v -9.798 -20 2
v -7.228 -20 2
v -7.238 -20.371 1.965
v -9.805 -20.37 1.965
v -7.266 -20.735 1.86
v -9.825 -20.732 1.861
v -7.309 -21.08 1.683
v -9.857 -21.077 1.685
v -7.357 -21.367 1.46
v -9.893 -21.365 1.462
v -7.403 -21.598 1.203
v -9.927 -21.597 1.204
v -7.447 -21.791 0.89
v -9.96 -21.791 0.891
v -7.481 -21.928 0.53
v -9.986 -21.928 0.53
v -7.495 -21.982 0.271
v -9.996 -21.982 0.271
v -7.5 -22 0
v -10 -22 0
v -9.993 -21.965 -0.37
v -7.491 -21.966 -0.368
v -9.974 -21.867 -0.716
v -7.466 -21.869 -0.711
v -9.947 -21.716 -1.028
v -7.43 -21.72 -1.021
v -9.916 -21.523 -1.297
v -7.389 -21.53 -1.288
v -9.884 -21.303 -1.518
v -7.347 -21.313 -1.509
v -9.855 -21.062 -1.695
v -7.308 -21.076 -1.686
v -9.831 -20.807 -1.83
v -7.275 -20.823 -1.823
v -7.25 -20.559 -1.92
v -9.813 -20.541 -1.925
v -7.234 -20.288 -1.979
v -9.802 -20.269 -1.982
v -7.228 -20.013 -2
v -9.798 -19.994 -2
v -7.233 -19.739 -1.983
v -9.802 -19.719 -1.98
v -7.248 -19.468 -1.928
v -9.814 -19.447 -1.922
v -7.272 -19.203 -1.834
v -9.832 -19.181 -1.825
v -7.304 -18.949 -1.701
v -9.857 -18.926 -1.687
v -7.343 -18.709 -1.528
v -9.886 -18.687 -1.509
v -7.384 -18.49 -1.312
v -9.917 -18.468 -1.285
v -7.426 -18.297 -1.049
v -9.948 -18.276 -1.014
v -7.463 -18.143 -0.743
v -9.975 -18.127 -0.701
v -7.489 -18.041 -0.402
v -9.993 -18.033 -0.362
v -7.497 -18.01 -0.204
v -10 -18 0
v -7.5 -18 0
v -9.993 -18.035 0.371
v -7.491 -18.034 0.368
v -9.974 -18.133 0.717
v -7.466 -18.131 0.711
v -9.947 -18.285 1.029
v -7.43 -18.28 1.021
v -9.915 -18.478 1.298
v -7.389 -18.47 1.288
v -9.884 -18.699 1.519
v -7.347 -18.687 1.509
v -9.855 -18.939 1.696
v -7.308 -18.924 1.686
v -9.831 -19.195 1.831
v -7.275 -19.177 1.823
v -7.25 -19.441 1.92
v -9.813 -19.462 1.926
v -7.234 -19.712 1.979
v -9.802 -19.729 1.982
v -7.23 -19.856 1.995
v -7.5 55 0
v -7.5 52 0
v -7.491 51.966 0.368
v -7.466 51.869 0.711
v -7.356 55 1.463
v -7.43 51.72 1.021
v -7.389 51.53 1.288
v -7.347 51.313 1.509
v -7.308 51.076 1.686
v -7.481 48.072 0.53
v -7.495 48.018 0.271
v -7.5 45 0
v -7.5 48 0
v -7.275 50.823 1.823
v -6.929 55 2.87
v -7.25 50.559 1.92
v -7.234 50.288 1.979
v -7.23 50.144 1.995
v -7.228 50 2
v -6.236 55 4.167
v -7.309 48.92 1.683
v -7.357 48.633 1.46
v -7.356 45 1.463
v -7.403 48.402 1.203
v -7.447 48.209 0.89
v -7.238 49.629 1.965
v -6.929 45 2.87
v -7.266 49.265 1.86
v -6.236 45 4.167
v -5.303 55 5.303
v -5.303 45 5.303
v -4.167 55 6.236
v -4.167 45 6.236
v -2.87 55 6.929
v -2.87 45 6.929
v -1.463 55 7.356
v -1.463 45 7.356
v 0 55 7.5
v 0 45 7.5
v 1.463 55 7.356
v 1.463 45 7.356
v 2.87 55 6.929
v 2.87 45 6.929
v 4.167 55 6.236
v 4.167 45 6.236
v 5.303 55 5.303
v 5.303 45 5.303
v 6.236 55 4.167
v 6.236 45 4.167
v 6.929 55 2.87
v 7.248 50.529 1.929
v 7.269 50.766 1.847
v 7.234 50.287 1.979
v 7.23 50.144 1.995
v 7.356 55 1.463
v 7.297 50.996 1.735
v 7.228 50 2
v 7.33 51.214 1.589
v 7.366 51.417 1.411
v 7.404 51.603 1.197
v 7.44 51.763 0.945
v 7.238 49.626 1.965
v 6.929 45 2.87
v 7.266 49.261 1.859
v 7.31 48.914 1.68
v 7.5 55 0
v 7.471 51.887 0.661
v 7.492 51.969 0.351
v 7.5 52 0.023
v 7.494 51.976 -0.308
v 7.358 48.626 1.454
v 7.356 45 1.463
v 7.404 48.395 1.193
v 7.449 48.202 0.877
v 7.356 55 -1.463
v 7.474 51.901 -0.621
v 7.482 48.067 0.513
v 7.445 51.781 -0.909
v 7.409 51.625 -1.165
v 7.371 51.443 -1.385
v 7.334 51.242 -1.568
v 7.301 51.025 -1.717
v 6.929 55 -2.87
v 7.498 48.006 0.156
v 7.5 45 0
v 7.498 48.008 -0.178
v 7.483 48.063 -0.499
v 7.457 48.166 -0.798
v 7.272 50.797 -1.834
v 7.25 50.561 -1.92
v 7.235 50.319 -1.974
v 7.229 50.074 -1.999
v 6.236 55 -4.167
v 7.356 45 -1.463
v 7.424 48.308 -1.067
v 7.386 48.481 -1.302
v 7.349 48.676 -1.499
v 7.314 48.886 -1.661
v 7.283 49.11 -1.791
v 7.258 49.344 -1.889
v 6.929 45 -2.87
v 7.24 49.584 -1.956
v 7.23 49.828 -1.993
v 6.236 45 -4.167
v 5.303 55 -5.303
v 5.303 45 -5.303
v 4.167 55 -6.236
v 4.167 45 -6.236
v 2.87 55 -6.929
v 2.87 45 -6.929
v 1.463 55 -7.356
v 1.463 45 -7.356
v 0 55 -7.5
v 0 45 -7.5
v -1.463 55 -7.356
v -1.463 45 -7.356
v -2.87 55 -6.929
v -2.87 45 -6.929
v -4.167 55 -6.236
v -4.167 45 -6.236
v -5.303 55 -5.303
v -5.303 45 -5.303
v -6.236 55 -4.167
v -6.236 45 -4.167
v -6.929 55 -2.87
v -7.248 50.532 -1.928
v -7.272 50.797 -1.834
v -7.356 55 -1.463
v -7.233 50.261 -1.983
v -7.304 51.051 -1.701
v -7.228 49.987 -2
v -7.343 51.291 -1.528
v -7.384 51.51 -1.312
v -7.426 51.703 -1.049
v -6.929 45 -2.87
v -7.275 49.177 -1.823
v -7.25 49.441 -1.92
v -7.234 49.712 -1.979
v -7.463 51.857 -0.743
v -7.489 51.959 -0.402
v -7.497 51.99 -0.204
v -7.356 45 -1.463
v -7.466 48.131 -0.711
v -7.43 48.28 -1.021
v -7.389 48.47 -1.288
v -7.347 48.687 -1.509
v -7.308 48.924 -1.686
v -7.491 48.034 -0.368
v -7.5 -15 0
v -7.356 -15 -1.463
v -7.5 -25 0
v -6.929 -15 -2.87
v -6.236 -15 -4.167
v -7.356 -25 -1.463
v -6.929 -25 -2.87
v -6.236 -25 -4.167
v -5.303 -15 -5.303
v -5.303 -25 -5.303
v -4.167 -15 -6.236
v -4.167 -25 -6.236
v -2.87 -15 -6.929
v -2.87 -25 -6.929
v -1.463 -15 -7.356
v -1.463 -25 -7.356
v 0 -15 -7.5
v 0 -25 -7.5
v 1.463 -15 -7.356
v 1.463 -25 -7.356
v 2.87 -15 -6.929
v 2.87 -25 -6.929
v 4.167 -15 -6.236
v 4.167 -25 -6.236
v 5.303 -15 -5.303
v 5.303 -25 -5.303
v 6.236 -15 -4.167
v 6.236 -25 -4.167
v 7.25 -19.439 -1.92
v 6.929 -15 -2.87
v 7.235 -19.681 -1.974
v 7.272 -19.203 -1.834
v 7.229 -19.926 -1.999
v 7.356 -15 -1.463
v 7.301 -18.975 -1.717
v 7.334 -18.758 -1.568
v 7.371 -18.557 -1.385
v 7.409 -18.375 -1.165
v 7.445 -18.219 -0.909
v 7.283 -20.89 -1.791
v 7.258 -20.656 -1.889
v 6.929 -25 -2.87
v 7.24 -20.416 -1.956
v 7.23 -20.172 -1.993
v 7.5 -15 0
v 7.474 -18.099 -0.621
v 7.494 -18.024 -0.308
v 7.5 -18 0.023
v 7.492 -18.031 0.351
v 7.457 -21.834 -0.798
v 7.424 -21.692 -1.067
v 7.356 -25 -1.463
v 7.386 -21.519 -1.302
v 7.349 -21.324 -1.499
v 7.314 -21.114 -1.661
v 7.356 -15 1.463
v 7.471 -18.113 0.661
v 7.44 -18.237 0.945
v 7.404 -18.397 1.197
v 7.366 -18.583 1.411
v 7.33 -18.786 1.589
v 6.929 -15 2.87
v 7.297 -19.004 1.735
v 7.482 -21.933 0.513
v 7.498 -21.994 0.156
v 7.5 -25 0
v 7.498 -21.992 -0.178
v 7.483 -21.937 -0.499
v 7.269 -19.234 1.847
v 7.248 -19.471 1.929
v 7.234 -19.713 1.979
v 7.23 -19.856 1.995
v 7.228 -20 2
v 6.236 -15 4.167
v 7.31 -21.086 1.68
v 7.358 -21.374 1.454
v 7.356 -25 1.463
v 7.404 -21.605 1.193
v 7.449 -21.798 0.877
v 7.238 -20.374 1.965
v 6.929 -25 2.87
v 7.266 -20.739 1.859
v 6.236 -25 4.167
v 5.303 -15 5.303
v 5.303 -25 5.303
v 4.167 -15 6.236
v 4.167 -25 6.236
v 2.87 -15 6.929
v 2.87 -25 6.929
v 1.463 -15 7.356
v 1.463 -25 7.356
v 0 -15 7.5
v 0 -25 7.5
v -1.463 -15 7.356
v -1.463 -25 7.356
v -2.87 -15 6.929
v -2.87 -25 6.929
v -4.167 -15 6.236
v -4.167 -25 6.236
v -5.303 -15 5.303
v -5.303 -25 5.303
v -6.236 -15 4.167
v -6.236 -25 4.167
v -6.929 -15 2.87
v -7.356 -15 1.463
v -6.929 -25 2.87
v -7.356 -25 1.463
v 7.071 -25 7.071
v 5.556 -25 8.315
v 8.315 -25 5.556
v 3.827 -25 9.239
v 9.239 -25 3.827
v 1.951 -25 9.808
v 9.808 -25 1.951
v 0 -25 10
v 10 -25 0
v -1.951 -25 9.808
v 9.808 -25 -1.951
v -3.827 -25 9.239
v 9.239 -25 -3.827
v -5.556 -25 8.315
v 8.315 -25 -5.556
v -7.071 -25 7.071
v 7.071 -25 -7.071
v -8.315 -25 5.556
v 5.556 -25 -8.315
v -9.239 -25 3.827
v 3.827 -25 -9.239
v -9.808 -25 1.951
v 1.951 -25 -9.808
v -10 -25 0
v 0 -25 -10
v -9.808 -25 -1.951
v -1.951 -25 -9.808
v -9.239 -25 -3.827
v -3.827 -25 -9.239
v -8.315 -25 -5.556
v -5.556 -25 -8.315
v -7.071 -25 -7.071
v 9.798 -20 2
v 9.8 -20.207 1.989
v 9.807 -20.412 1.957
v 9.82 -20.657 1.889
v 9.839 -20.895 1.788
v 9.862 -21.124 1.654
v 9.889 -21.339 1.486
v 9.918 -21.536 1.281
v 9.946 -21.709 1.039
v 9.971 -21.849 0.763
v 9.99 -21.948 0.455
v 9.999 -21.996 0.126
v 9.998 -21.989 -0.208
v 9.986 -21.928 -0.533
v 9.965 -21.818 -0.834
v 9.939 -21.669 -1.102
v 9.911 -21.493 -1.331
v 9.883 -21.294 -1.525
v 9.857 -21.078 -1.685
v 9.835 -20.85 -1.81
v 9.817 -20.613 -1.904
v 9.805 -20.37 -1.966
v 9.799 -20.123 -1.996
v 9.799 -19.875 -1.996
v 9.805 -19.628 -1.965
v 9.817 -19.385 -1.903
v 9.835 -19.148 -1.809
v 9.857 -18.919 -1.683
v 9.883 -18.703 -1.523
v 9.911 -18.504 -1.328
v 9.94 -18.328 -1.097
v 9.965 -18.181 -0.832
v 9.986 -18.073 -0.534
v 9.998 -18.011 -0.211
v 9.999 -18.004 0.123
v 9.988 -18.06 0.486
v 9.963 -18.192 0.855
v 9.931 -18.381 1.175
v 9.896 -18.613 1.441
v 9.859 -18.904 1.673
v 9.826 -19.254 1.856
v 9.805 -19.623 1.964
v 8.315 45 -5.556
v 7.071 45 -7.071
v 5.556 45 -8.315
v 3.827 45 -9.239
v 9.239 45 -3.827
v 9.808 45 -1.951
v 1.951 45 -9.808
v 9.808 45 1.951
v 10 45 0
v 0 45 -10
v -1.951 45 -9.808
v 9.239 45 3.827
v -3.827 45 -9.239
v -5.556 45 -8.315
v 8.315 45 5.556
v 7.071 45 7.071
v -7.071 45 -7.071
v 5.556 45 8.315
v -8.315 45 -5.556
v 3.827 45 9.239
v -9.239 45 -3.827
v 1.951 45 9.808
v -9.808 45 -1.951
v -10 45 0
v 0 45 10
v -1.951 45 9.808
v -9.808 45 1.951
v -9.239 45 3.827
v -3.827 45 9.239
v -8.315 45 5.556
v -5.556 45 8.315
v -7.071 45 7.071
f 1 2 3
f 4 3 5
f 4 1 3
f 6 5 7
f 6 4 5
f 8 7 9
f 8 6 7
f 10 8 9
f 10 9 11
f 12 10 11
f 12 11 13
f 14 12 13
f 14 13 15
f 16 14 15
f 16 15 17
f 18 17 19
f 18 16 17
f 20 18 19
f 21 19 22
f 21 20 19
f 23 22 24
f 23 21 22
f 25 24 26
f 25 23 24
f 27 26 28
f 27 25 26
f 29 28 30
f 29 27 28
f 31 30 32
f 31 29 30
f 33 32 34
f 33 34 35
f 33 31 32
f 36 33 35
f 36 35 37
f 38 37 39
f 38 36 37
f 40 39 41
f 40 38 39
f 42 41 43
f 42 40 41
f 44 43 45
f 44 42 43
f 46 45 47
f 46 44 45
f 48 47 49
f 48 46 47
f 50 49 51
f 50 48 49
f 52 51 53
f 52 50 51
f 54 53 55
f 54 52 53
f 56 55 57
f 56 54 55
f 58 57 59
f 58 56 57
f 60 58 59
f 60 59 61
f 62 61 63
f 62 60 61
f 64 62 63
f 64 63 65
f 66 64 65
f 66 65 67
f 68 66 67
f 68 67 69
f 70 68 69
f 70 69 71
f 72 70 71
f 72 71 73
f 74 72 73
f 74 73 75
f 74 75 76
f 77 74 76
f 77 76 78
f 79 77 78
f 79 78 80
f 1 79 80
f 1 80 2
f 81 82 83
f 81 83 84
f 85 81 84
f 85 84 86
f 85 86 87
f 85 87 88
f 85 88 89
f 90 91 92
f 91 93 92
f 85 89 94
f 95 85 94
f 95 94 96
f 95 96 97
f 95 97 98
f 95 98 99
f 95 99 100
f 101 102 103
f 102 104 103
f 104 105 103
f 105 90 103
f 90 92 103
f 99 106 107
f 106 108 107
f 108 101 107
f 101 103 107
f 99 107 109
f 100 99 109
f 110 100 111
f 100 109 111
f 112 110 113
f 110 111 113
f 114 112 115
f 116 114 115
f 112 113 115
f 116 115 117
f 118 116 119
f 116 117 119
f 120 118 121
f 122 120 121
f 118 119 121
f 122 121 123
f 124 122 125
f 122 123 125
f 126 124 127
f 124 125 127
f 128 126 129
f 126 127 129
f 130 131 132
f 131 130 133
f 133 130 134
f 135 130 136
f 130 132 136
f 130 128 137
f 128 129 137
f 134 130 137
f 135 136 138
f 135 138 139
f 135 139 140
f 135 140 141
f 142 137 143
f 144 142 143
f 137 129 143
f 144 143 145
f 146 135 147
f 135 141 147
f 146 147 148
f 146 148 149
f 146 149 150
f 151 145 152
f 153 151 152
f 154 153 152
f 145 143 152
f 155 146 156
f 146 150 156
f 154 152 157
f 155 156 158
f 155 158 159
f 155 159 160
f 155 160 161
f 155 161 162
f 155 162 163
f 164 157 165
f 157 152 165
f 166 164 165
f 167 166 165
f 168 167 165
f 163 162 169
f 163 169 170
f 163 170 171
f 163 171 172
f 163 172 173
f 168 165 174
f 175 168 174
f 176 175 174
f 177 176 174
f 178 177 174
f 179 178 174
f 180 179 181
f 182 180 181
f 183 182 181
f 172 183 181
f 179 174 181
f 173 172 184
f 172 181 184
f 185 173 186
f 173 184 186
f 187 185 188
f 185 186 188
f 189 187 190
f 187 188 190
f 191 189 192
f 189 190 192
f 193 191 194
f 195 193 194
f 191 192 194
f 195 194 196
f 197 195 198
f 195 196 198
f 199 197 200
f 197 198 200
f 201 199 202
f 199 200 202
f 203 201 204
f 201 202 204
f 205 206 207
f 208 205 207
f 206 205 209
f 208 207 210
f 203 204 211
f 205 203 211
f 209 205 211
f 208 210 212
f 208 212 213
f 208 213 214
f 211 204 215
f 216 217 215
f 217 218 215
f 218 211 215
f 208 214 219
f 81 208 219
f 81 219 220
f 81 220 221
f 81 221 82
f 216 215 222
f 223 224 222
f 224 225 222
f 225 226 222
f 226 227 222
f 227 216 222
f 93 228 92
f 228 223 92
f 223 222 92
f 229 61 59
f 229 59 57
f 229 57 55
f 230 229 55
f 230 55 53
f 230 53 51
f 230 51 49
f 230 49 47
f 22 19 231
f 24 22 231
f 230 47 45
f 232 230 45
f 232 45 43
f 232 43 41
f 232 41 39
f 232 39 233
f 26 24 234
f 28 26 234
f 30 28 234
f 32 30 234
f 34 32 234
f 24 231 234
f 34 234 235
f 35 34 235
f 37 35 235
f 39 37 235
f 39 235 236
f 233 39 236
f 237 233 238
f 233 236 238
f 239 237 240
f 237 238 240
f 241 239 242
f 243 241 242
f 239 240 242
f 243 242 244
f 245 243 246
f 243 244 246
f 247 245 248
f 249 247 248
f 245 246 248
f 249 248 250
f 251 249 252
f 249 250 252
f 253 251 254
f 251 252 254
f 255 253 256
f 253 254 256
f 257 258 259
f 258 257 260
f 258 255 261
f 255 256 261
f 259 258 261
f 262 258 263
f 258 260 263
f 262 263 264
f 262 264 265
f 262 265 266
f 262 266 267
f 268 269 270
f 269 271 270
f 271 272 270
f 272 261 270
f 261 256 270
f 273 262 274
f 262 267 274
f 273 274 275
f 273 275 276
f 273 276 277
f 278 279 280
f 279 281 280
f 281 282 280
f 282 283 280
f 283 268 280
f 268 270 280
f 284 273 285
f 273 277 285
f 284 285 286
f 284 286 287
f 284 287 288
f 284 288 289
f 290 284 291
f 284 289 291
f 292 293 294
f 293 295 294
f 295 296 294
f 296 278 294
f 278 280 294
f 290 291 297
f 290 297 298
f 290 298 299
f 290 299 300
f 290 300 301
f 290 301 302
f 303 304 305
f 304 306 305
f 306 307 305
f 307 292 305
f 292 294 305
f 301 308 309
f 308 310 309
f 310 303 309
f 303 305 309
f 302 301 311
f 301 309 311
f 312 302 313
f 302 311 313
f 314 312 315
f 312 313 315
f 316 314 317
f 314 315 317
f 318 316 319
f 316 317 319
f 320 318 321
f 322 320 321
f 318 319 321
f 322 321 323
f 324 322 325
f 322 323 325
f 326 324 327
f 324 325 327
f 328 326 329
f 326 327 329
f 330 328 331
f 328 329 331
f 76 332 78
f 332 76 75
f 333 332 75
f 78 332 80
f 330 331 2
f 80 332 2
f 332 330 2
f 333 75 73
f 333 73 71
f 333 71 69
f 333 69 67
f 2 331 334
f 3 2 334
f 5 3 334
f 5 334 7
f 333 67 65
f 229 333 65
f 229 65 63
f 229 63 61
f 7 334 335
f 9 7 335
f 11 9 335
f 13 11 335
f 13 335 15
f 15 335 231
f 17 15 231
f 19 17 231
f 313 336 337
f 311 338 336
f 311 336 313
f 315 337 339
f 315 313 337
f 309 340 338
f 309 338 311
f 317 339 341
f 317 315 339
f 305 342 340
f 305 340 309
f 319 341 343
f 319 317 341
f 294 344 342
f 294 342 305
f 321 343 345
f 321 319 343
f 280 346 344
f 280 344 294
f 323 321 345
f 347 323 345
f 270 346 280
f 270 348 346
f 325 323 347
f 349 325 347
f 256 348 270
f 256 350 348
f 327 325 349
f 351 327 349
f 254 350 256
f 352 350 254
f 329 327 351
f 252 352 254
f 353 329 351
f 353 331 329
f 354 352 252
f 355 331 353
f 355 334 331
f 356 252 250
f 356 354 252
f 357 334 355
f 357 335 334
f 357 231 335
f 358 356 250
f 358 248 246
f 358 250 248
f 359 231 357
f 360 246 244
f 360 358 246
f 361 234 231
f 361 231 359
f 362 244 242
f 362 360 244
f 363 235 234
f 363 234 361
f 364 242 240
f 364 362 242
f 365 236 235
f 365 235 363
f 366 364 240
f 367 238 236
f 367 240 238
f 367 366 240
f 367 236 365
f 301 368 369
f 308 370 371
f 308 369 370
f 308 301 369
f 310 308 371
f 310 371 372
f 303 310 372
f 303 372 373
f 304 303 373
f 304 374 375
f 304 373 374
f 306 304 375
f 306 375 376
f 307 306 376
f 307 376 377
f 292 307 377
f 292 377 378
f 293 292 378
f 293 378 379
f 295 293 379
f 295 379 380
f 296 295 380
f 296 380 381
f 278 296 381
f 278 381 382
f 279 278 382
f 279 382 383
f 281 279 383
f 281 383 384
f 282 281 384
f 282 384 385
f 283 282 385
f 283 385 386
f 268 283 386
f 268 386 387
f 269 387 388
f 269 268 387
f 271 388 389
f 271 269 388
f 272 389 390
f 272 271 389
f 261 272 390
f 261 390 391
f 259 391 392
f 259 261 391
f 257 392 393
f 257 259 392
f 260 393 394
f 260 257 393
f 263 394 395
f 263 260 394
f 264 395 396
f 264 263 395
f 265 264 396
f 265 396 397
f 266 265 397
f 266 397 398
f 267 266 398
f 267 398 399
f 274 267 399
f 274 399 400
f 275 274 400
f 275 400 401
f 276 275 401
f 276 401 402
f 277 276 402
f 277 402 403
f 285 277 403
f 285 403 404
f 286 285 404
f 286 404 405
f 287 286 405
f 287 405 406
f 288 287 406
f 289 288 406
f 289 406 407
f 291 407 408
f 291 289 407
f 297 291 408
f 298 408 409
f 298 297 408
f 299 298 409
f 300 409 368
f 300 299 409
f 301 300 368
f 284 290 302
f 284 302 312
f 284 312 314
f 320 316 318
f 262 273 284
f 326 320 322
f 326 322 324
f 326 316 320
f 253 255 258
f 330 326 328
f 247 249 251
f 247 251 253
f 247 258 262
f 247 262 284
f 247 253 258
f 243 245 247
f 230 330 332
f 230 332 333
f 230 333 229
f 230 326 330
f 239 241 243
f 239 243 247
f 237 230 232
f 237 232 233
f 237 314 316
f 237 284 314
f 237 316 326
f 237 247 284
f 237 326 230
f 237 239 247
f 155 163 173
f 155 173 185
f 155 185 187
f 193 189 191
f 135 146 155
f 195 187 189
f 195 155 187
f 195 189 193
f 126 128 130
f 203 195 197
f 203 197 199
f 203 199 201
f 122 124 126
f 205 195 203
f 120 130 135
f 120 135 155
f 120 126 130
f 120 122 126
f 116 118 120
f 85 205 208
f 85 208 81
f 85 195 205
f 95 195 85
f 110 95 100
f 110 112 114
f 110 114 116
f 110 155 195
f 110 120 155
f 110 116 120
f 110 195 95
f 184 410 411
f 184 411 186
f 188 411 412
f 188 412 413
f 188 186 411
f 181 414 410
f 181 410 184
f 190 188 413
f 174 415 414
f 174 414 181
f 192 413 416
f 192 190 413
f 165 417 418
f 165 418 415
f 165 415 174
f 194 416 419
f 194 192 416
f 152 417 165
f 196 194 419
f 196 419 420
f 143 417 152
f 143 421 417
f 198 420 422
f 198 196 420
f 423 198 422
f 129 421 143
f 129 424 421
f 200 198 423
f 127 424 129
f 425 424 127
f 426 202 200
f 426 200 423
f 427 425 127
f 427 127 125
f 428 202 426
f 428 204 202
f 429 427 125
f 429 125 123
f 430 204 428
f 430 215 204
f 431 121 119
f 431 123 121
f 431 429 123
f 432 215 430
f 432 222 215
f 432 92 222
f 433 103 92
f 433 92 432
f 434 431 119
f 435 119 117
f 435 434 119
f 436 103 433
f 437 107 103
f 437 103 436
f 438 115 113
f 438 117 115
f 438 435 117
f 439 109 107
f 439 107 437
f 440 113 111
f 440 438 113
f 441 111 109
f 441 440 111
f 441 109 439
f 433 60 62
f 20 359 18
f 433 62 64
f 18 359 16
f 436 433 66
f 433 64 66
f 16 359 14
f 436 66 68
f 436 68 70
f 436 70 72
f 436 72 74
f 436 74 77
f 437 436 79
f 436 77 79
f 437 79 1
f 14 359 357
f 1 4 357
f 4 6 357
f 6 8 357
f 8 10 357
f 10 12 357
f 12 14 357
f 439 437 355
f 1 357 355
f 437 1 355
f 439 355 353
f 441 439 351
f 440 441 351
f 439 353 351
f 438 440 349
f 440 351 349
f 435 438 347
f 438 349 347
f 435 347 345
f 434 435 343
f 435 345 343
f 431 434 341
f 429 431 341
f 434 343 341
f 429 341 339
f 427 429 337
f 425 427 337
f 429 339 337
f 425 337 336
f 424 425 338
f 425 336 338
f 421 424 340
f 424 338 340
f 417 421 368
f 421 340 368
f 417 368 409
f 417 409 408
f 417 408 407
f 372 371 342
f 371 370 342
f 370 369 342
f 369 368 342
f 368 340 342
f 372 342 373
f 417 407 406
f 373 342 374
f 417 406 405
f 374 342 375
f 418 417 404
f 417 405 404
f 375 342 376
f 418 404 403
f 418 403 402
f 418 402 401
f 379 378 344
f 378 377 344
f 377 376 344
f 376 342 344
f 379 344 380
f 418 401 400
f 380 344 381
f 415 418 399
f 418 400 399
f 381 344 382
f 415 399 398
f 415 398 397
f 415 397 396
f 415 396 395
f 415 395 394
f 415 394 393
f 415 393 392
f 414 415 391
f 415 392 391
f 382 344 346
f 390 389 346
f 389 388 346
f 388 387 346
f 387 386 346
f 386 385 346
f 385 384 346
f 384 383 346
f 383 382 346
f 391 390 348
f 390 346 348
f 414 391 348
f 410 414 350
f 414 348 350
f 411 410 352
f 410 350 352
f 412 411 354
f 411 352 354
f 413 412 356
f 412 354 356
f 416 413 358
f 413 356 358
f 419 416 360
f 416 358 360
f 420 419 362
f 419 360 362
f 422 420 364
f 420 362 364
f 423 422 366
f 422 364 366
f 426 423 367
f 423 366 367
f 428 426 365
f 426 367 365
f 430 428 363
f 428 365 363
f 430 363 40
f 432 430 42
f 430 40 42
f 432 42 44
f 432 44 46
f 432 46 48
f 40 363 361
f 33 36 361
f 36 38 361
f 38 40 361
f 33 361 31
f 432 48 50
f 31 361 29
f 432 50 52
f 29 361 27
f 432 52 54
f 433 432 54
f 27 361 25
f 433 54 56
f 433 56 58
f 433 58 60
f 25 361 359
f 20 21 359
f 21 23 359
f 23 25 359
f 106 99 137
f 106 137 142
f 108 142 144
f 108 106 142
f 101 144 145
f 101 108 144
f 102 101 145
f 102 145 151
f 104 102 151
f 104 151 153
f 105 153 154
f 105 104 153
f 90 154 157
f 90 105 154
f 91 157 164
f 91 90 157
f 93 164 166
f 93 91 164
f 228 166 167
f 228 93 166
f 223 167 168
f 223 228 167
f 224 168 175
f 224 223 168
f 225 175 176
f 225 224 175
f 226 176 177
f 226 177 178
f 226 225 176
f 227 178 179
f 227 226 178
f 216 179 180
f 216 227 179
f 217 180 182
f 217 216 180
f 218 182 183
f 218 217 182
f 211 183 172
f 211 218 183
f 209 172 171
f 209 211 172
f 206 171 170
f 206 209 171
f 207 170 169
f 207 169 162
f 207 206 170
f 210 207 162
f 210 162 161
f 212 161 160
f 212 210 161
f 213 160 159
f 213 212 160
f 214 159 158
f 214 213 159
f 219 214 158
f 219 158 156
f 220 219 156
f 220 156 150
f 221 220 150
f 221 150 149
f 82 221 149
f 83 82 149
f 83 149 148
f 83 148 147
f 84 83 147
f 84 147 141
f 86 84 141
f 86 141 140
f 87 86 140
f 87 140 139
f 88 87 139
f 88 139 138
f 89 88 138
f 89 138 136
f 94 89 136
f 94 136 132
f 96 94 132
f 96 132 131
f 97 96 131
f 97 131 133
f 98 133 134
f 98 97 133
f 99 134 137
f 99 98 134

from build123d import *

# Parameters (mm, degrees)
SKETCH2_R               = 10
BOSS_EXTRUDE1_DEPTH     = 30
CUT_EXTRUDE1_START      = -10
SKETCH3_R               = 10
SKETCH3_R_2             = 7.5
CUT_EXTRUDE1_DEPTH      = 10
CUT_EXTRUDE3_DEPTH      = 10
CUT_EXTRUDE3_DEPTH_BACK = 10
SKETCH5_R               = 2
FILLET2_R               = 10
BOSS_EXTRUDE2_START     = -67.5
SKETCH7_R               = 10
BOSS_EXTRUDE2_DEPTH     = 67.5
SKETCH8_R               = 50
SKETCH8_R_2             = 10
CUT_EXTRUDE6_DEPTH      = 107.770782567
SKETCH9_R               = 7.5
CUT_EXTRUDE7_DEPTH      = 10
CUT_EXTRUDE8_DEPTH      = 10
CUT_EXTRUDE8_DEPTH_BACK = 10
SKETCH10_R              = 2


with BuildPart() as part:
    # Sketch1 → Revolve1 (revolve)
    with BuildSketch(Plane.XY):
        Polygon((50, 25), (0, 25), (0, 22.5), (45, 22.5), (45, -22.5), (0, -22.5), (0, -25), (50, -25), align=None)
    revolve(axis=Axis((0, -25, 0), (0, 1, 0)))

    # Sketch2 → Boss-Extrude1 (add)
    with BuildSketch(Plane(origin=(0, 25, 0), x_dir=(1, 0, 0), z_dir=(0, 1, 0))):
        with Locations(Location((0, 0, 0), (0, 0, 180))):
            Circle(SKETCH2_R)
    extrude(amount=BOSS_EXTRUDE1_DEPTH)

    # Sketch3 → Cut-Extrude1 (cut)
    with BuildSketch(Plane(origin=(0, 55, 0), x_dir=(1, 0, 0), z_dir=(0, 1, 0)).offset(CUT_EXTRUDE1_START)):
        with Locations(Location((0, 0, 0), (0, 0, 180))):
            Circle(SKETCH3_R)
        with Locations(Location((0, 0, 0), (0, 0, 180))):
            Circle(SKETCH3_R_2, mode=Mode.SUBTRACT)
    extrude(amount=CUT_EXTRUDE1_DEPTH, mode=Mode.SUBTRACT)

    # Sketch5 → Cut-Extrude3 (cut, two sides: drawn at the far end of the back side and taken through both)
    with BuildSketch(Plane(origin=(0, 0, 0), x_dir=(0, 0, -1), z_dir=(1, 0, 0)).offset(-CUT_EXTRUDE3_DEPTH_BACK)):
        with Locations(Location((0, 50, 0), (0, 0, 180))):
            Circle(SKETCH5_R)
    extrude(amount=CUT_EXTRUDE3_DEPTH + CUT_EXTRUDE3_DEPTH_BACK, mode=Mode.SUBTRACT)

    # Fillet2
    fillet2_edges = [part.edges().sort_by_distance(p)[0] for p in [
        (-50, 25, 0),
    ]]
    fillet(fillet2_edges, radius=FILLET2_R)

    # Sketch7 → Boss-Extrude2 (add)
    with BuildSketch(Plane(origin=(0, 45, 0), x_dir=(1, 0, 0), z_dir=(0, 1, 0)).offset(BOSS_EXTRUDE2_START)):
        with Locations(Location((0, 0, 0), (0, 0, 180))):
            Circle(SKETCH7_R)
    extrude(amount=BOSS_EXTRUDE2_DEPTH)

    # Sketch8 → Cut-Extrude6 (cut, through all)
    with BuildSketch(Plane(origin=(0, 55, 0), x_dir=(1, 0, 0), z_dir=(0, 1, 0))):
        Circle(SKETCH8_R)
        with Locations(Location((0, 0, 0), (0, 0, 180))):
            Circle(SKETCH8_R_2, mode=Mode.SUBTRACT)
    extrude(amount=-CUT_EXTRUDE6_DEPTH, mode=Mode.SUBTRACT)

    # Sketch9 → Cut-Extrude7 (cut)
    with BuildSketch(Plane.XZ.offset(25)):
        with Locations(Location((0, 0, 0), (0, 0, 180))):
            Circle(SKETCH9_R)
    extrude(amount=-CUT_EXTRUDE7_DEPTH, mode=Mode.SUBTRACT)

    # Sketch10 → Cut-Extrude8 (cut, two sides: drawn at the far end of the back side and taken through both)
    with BuildSketch(Plane(origin=(0, 0, 0), x_dir=(0, 0, -1), z_dir=(1, 0, 0)).offset(-CUT_EXTRUDE8_DEPTH_BACK)):
        with Locations(Location((0, -20, 0), (0, 0, 180))):
            Circle(SKETCH10_R)
    extrude(amount=CUT_EXTRUDE8_DEPTH + CUT_EXTRUDE8_DEPTH_BACK, mode=Mode.SUBTRACT)


solid = part.part
